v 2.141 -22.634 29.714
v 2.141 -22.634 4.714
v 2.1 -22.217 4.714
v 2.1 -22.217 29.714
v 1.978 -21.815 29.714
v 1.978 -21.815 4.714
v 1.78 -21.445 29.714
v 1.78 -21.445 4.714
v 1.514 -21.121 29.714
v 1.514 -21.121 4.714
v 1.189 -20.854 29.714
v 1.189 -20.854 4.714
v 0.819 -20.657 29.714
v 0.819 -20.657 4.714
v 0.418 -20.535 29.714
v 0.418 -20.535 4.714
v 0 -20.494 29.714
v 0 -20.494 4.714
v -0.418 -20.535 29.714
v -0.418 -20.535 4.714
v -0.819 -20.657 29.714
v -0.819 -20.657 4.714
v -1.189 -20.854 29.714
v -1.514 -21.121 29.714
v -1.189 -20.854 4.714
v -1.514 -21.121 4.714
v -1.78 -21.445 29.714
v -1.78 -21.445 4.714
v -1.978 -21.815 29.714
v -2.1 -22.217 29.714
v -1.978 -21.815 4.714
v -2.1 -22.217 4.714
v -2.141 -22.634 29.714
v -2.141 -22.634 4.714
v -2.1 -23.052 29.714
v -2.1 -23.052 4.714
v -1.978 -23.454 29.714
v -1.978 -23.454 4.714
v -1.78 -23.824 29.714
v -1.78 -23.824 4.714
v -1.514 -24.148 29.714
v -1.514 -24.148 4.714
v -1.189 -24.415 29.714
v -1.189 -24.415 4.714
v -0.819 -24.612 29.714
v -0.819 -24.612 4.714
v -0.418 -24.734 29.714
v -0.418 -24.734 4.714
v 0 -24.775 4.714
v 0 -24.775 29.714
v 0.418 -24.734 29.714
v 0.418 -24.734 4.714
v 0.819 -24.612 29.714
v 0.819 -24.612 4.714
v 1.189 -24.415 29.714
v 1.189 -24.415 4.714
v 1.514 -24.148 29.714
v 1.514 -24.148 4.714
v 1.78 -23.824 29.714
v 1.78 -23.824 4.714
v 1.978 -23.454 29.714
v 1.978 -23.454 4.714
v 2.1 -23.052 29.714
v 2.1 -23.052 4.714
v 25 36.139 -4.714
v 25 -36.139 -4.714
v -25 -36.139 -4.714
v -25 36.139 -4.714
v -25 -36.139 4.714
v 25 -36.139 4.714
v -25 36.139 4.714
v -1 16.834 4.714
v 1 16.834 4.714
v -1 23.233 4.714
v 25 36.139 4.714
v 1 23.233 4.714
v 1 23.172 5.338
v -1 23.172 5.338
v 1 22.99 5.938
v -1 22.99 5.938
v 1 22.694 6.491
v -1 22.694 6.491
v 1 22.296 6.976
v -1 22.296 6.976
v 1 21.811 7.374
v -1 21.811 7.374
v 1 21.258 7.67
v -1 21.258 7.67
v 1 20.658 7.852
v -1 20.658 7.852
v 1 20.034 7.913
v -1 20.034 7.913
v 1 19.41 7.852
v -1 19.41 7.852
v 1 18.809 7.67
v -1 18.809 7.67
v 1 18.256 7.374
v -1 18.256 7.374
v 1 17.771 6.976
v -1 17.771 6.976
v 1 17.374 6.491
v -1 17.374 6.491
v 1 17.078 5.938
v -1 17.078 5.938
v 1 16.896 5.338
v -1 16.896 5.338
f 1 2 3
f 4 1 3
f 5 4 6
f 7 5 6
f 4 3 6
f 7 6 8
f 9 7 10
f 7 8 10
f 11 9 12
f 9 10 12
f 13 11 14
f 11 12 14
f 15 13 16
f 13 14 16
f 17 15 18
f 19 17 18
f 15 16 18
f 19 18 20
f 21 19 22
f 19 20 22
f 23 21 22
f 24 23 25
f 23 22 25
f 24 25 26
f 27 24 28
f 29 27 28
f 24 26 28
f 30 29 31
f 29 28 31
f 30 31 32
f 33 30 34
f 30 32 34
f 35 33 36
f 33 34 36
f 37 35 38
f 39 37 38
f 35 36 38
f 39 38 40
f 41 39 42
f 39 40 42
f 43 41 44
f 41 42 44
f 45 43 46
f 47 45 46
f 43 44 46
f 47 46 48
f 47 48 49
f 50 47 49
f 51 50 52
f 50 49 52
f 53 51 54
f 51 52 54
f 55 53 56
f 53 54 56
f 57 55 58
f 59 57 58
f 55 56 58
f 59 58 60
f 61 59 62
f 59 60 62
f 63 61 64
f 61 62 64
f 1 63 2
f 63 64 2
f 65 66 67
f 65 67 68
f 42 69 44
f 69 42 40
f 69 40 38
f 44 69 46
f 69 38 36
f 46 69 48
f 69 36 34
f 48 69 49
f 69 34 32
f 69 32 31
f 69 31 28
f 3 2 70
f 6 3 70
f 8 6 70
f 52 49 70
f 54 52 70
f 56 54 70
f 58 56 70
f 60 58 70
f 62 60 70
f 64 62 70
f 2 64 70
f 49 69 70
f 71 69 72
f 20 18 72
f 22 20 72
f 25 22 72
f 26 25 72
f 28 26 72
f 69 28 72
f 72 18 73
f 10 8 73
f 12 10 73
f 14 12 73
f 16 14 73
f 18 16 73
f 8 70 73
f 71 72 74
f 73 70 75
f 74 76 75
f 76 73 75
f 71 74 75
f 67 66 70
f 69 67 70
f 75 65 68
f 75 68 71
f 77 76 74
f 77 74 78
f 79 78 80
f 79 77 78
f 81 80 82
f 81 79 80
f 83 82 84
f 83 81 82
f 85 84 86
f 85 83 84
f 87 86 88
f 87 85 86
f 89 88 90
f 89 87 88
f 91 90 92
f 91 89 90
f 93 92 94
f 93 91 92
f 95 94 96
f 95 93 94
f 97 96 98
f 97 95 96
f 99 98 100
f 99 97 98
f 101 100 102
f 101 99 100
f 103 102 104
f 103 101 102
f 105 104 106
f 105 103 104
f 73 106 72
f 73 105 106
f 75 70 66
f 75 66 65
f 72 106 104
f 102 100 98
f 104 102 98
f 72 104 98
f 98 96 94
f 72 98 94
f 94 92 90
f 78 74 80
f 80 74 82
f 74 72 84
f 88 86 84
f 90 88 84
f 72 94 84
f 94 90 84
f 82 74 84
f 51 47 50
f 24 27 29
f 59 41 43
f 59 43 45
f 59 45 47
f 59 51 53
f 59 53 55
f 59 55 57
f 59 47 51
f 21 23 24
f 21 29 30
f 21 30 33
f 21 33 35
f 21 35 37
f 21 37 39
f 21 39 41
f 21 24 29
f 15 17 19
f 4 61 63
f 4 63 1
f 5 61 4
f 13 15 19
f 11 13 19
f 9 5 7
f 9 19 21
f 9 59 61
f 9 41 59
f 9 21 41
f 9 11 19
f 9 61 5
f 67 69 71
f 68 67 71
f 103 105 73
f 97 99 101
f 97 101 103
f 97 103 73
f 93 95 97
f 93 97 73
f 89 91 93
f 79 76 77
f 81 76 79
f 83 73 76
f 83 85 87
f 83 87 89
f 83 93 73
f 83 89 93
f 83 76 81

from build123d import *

# Parameters (mm, degrees)
F0_W     = 72.277866
F0_H     = 9.427548
F1_DEPTH = 25
F2_R     = 2.140903
F3_DEPTH = 25
F4_R     = 3.199453
F5_DEPTH = 1


with BuildPart() as f1:
    # F0 (on Right) → F1 (new body, symmetric)
    with BuildSketch(Plane.YZ):
        Rectangle(F0_W, F0_H)
    extrude(amount=F1_DEPTH, both=True)

    # F2 (on face) → F3 (join)
    with BuildSketch(Plane.XY.offset(4.713774)):
        with Locations((0, -22.634452)):
            Circle(F2_R)
    extrude(amount=F3_DEPTH)

    # F4 (on Right) → F5 (join, symmetric)
    with BuildSketch(Plane.YZ):
        with Locations((20.03381, 4.713774)):
            Circle(F4_R)
    extrude(amount=F5_DEPTH, both=True)


solid = f1.part
